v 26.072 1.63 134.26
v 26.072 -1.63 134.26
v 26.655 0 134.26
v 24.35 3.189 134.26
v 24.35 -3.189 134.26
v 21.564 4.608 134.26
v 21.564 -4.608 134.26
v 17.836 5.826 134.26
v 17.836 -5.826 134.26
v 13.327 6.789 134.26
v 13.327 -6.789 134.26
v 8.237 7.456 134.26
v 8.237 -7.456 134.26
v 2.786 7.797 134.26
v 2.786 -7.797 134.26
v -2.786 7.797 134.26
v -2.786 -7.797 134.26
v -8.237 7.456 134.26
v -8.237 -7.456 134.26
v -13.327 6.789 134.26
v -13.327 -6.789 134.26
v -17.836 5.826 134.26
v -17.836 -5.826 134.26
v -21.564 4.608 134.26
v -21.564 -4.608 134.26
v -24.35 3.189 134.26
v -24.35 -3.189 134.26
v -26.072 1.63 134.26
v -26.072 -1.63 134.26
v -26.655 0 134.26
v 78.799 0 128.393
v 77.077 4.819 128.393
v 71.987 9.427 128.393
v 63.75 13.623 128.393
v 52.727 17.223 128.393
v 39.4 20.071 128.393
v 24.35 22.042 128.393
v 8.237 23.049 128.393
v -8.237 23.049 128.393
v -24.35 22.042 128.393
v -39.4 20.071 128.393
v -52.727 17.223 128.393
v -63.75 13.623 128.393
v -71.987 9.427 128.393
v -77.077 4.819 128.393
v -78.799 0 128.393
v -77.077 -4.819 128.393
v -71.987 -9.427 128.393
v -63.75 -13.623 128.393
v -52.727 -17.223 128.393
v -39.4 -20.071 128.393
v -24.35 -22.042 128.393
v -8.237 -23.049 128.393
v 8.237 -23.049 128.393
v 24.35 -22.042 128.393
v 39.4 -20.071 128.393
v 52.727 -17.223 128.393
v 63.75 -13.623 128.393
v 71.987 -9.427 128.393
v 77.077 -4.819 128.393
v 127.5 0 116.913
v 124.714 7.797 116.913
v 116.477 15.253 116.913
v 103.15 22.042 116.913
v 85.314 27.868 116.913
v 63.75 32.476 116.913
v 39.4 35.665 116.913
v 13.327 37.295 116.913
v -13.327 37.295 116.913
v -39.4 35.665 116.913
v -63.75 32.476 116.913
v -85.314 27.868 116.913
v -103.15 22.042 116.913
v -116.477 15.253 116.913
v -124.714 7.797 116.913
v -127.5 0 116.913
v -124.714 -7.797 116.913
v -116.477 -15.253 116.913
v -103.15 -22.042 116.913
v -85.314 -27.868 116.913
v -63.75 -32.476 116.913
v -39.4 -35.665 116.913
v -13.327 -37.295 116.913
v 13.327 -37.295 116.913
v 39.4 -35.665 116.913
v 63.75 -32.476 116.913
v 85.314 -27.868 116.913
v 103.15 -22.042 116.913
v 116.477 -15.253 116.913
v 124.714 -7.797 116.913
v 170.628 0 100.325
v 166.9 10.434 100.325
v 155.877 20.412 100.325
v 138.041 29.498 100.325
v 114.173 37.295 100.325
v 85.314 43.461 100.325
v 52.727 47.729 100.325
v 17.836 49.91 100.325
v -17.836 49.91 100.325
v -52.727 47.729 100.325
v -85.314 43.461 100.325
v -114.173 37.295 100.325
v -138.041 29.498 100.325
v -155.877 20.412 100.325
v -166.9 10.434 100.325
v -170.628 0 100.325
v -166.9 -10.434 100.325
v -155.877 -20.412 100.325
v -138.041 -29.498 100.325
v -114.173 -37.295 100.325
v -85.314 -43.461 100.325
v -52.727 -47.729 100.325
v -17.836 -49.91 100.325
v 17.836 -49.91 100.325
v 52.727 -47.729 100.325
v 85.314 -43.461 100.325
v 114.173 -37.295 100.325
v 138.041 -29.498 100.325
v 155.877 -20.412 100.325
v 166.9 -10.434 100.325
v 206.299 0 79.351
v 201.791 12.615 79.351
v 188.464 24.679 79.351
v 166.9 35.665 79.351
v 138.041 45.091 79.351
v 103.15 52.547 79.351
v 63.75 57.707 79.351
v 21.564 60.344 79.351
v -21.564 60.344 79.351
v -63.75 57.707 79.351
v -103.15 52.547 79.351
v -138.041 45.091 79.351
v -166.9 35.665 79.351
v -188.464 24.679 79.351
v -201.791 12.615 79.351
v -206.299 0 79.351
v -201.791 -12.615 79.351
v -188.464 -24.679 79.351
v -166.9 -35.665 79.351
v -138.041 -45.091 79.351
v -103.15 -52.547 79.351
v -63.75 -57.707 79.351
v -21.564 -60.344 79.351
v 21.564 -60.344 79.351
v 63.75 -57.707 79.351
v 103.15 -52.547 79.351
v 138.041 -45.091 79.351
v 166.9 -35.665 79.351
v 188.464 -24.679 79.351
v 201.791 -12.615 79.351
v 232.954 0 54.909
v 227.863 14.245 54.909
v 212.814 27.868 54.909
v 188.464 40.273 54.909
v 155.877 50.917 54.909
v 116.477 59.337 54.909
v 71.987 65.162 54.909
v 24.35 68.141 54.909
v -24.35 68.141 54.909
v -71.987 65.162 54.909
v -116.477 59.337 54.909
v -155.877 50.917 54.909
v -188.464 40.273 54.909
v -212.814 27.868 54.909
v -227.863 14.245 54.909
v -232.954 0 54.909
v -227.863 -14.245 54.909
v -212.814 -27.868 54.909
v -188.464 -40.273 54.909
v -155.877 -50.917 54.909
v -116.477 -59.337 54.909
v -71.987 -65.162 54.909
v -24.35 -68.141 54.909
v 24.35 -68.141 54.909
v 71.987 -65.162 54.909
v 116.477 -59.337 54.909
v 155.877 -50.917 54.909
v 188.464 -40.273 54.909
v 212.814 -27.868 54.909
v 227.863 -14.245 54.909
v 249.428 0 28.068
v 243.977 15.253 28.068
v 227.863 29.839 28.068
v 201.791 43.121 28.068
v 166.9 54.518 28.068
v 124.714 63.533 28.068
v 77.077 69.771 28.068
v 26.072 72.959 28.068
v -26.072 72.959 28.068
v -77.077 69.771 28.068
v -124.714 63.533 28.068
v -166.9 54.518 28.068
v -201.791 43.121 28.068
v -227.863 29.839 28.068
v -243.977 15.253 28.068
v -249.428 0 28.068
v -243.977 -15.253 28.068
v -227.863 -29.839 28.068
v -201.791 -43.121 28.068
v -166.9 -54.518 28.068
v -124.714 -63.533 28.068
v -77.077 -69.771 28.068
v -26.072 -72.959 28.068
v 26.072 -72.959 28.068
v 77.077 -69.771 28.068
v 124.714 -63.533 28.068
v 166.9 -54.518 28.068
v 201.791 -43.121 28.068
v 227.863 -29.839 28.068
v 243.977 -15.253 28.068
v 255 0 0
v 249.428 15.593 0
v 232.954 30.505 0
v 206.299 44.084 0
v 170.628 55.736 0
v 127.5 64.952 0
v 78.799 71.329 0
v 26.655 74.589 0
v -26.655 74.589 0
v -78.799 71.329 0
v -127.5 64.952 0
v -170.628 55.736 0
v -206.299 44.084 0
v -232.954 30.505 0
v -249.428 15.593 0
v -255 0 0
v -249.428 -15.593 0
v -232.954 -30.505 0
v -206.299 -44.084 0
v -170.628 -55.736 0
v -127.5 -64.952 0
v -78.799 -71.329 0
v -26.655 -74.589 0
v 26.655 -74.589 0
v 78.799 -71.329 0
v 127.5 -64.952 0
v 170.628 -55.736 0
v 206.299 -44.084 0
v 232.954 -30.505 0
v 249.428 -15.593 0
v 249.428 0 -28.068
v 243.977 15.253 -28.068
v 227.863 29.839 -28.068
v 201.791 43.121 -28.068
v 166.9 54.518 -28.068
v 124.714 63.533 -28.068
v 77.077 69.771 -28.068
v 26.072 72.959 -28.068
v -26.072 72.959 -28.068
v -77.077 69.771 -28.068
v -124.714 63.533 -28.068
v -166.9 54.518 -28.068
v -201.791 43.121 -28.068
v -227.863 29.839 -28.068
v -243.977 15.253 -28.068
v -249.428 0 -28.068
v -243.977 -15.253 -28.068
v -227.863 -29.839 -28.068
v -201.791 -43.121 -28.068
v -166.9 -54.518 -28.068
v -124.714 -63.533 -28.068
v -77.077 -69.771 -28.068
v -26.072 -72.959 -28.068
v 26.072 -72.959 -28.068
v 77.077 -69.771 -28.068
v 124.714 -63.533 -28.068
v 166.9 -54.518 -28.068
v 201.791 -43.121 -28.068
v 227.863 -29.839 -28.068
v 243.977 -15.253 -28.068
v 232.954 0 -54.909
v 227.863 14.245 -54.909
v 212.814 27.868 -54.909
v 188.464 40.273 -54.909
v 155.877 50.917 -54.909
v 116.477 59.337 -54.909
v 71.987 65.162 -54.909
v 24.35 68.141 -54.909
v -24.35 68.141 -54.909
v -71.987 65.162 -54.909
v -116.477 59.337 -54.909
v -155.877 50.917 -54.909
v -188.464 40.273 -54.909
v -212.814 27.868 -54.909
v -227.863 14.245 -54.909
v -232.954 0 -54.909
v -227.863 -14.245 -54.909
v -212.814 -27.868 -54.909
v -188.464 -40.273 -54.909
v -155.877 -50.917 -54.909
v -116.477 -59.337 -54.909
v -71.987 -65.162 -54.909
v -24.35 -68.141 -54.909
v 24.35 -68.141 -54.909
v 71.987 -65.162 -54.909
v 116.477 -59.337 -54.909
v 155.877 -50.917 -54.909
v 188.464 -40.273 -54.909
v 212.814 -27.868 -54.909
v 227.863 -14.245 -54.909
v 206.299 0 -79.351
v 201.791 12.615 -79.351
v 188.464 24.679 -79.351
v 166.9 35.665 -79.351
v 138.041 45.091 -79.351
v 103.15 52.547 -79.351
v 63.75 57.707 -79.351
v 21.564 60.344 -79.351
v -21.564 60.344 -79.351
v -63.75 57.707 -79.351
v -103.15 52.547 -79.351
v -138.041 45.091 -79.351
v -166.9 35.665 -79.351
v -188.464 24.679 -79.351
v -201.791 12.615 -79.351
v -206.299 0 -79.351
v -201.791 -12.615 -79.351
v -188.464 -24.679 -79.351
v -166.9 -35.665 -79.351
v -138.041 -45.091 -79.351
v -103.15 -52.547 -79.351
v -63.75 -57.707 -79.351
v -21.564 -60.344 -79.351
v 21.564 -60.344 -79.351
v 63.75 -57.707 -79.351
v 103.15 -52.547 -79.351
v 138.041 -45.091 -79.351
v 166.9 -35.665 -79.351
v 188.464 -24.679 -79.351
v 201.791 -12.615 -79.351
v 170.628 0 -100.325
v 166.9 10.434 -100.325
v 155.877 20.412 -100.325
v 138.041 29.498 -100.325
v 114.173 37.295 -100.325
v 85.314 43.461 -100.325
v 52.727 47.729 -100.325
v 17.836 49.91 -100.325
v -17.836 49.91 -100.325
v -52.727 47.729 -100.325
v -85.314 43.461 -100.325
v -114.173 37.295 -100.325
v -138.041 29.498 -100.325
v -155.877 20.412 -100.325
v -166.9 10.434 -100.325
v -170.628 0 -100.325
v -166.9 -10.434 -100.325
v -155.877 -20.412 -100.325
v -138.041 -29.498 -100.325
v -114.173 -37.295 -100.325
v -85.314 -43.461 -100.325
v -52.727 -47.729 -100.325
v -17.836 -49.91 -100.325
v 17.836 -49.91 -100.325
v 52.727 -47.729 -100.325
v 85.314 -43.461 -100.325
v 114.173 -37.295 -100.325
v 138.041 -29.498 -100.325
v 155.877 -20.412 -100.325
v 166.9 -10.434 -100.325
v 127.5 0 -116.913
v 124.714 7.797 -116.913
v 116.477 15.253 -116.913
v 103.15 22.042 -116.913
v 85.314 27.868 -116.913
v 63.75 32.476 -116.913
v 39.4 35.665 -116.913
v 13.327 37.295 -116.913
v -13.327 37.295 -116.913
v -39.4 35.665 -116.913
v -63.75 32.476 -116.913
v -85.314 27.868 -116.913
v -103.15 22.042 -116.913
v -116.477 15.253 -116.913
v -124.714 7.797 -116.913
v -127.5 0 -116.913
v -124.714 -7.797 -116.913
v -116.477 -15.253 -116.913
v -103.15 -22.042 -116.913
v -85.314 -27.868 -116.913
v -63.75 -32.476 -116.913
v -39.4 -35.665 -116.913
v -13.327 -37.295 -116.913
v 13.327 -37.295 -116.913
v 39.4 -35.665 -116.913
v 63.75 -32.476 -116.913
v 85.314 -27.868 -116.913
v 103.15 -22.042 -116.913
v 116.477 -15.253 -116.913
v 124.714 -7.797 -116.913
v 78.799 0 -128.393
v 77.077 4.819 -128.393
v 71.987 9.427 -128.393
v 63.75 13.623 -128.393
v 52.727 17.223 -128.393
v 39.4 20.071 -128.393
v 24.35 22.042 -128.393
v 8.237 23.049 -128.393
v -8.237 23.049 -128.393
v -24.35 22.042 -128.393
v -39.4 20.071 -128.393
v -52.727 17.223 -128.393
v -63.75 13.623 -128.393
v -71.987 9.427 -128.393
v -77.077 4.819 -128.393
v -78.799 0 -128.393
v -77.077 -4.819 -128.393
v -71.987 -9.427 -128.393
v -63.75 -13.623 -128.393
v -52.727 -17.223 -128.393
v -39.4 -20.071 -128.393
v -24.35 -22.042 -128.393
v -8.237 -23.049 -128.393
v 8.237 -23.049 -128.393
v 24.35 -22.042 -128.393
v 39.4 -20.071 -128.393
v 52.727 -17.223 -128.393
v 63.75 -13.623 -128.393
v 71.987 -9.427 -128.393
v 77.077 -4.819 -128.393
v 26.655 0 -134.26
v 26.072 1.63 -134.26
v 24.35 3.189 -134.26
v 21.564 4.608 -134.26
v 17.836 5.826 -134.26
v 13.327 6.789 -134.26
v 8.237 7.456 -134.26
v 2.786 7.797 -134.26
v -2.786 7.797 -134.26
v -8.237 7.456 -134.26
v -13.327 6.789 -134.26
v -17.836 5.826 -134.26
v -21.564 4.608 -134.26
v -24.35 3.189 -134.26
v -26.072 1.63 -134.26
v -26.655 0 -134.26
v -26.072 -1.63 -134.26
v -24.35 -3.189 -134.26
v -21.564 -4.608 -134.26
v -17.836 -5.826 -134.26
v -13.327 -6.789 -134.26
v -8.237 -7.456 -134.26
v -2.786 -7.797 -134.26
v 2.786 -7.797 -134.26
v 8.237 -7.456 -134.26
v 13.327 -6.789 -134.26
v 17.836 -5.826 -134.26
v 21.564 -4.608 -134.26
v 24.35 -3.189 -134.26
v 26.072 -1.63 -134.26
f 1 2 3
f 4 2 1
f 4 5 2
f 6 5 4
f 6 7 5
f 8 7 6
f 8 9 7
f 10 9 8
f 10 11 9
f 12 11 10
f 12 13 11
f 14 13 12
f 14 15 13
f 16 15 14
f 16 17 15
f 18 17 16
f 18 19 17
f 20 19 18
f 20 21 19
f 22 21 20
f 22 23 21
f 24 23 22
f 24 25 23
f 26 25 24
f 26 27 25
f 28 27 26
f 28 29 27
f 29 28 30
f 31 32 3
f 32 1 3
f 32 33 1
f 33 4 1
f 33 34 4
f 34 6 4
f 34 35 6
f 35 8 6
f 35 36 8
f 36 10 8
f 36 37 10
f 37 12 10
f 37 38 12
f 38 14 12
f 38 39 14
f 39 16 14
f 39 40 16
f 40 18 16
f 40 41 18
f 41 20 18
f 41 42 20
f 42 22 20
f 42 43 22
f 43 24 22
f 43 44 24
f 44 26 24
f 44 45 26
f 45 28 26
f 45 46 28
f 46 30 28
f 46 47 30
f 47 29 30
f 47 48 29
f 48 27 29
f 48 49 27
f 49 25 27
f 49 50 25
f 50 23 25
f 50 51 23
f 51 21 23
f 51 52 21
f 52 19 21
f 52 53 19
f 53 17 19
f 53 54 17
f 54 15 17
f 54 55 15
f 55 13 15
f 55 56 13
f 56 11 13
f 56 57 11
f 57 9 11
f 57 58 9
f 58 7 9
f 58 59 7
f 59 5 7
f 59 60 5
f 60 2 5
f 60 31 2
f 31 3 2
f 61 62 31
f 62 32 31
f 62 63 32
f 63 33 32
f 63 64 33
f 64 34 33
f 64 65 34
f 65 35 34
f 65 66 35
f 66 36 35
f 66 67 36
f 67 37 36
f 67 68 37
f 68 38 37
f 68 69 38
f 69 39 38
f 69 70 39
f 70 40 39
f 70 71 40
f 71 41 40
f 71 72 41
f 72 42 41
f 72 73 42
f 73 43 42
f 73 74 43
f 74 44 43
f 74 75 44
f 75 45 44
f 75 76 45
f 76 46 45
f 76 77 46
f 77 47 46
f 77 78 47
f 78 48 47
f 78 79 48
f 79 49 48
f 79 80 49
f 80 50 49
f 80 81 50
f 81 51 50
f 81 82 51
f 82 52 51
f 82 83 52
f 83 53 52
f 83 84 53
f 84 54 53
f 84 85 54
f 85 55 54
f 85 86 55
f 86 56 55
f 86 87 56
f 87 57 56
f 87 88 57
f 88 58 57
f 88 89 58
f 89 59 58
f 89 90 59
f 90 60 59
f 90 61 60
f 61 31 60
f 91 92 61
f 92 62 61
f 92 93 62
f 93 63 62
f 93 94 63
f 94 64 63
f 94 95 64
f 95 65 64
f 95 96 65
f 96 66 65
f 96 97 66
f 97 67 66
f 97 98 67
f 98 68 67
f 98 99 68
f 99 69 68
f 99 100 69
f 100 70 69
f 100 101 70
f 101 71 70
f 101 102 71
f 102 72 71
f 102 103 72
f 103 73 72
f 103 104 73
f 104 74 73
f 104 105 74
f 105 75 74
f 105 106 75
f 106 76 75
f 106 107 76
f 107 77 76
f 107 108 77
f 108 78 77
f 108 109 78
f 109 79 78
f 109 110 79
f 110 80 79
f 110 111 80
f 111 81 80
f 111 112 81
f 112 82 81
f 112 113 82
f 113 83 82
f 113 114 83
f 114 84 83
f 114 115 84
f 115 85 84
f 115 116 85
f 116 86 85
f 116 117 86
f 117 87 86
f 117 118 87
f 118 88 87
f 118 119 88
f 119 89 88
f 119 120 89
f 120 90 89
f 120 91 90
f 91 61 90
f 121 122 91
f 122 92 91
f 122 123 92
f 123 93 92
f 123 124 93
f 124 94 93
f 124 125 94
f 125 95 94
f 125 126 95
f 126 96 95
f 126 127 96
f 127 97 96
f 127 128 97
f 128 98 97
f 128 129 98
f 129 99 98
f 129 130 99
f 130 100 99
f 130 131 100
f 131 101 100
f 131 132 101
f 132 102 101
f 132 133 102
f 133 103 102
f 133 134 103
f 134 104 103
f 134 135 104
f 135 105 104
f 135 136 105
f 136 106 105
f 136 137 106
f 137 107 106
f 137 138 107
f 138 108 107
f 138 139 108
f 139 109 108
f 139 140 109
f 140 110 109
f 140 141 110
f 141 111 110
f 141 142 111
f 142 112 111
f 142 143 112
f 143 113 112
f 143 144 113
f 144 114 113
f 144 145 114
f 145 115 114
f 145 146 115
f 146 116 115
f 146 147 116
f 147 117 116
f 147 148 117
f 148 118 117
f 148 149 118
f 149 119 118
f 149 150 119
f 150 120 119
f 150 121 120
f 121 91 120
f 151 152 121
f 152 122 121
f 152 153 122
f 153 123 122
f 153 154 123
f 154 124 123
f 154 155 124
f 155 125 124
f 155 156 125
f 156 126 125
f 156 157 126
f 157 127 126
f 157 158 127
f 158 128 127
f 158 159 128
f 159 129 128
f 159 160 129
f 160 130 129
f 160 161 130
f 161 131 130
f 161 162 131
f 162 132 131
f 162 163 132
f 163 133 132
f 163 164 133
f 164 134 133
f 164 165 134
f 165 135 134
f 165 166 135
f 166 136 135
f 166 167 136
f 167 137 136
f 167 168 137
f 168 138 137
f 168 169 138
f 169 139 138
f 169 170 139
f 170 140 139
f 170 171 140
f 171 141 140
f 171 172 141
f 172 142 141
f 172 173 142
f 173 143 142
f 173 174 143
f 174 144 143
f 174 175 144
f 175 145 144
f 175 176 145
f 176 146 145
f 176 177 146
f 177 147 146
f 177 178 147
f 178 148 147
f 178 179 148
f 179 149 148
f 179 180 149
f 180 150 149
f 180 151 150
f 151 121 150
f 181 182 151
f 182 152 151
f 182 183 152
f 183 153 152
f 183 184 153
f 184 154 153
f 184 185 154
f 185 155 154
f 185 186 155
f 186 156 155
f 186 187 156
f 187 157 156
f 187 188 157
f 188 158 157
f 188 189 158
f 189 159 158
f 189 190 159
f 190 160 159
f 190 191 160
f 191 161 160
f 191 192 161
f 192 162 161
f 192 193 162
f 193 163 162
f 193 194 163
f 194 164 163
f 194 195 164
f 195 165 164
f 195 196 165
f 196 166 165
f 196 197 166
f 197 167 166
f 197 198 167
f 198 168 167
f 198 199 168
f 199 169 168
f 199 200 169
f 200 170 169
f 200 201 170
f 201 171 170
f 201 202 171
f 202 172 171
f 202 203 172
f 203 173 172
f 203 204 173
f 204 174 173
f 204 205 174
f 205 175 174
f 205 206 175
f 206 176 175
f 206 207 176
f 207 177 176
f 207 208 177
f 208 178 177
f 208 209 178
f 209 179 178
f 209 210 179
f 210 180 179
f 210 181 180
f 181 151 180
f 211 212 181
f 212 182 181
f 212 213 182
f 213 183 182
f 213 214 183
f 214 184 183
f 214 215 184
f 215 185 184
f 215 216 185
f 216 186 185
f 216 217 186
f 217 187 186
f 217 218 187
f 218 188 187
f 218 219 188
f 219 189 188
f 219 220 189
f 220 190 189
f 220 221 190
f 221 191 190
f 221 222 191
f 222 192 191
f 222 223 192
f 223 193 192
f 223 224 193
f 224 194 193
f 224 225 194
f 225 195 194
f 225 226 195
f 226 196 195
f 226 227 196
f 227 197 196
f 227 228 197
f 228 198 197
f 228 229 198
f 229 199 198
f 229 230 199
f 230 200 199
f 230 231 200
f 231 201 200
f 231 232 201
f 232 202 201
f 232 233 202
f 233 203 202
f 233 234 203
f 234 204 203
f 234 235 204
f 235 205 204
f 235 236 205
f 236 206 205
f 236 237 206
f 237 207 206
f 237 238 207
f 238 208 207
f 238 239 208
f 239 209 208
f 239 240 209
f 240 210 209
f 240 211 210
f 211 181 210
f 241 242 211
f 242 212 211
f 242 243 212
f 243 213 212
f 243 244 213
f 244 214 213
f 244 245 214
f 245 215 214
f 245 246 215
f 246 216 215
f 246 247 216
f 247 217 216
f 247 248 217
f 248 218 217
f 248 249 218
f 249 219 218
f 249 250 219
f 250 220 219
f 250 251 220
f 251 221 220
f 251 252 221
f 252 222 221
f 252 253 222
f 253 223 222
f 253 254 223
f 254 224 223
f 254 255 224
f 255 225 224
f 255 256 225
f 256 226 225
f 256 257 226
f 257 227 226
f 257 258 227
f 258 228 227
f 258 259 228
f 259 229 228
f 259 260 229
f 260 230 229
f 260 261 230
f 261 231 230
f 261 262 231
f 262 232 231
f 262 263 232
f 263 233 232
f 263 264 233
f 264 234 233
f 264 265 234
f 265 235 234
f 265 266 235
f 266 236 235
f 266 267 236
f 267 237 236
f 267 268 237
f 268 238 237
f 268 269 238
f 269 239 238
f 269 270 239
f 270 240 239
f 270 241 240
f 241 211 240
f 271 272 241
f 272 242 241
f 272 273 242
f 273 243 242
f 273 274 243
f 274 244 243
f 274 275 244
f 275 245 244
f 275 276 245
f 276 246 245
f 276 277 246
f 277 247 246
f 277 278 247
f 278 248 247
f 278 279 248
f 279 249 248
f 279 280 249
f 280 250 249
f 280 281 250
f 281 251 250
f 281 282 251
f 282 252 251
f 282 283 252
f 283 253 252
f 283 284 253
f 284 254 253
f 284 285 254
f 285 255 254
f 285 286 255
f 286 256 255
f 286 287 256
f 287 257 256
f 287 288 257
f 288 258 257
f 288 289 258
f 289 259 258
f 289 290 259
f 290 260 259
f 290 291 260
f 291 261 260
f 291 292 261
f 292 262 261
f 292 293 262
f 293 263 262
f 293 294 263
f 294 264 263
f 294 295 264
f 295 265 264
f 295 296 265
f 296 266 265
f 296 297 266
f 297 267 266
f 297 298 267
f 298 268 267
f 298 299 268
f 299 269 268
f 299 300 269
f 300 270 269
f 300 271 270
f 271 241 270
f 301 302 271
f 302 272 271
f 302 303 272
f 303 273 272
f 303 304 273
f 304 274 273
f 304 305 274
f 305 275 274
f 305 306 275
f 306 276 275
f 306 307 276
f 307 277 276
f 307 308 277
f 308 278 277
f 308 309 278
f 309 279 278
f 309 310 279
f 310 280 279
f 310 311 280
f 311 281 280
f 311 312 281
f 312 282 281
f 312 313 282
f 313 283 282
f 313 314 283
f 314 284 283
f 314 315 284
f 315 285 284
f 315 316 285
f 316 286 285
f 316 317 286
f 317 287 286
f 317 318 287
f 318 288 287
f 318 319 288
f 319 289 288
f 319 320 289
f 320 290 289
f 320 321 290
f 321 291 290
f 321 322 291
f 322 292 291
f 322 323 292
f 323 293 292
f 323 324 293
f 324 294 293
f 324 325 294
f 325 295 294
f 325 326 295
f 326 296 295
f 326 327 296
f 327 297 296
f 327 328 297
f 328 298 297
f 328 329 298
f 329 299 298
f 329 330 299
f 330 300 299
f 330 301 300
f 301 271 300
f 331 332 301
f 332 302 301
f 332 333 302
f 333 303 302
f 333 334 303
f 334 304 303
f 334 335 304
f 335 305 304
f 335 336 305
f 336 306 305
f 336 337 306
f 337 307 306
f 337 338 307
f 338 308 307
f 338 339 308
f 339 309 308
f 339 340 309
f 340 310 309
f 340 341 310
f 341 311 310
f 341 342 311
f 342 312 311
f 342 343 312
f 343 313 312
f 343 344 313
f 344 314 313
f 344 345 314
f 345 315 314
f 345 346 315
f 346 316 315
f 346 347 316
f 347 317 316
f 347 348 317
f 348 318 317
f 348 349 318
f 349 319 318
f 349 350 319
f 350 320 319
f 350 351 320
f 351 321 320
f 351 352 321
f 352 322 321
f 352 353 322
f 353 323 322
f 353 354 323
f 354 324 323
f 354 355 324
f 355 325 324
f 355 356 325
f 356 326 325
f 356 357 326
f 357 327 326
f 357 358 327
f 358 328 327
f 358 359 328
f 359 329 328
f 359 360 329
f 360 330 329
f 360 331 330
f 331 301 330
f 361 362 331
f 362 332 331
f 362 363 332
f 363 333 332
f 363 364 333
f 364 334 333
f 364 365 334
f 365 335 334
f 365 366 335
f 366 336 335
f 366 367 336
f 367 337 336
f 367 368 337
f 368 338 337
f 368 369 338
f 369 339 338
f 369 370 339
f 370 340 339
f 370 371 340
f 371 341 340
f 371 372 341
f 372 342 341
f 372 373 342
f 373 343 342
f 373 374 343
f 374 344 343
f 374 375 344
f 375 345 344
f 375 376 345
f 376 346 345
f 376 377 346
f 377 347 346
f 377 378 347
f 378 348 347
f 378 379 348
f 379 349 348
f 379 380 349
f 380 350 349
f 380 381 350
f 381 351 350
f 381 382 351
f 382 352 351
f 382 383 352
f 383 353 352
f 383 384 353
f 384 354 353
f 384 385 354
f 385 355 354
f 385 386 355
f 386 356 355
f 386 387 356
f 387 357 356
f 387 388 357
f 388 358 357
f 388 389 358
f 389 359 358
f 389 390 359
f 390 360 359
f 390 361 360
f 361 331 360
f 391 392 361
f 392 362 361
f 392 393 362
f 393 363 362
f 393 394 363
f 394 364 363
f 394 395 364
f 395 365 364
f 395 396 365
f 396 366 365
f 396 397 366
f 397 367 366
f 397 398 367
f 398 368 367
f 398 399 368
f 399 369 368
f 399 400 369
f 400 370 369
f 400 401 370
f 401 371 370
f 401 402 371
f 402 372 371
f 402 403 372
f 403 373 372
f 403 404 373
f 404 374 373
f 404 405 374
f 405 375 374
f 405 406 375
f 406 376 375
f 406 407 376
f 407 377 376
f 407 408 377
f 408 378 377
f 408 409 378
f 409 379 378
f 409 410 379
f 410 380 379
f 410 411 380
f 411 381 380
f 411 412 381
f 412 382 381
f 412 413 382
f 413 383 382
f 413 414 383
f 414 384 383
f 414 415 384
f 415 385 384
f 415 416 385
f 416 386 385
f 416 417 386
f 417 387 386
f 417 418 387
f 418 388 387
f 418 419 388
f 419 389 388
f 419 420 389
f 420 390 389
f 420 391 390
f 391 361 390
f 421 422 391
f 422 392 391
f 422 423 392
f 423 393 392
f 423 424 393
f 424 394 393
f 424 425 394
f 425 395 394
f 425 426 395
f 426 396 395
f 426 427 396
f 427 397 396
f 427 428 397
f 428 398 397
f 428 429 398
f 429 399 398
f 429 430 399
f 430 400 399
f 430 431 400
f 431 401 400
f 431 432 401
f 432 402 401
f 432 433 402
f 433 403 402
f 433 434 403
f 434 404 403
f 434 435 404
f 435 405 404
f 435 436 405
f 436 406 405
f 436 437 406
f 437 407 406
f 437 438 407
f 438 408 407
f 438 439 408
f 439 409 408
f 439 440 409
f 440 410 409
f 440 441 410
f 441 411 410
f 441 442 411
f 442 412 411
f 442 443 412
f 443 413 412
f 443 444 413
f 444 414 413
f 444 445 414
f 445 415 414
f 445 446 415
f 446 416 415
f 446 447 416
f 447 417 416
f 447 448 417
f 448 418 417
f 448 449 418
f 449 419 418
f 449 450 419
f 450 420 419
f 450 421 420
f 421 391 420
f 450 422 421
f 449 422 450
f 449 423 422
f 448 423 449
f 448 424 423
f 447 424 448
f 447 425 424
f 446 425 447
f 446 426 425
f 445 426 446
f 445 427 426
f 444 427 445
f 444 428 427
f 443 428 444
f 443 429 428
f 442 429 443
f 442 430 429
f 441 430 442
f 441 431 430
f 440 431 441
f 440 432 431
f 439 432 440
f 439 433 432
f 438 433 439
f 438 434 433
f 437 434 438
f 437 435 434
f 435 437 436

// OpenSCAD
// Generated by SolidPython 1.0.1 on 2020-07-29 00:46:52


scale(v = [17, 5, 9]) {
	sphere(r = 15);
}
/***********************************************
*********      SolidPython code:      **********
************************************************
 
# import packages: SolidPython
from solid import *
from solid.utils import *
from itertools import chain, combinations, permutations


class Resize:

    def __init__(self, scad_file):
        self.scad_file = scad_file
        #self.scad_file = import_scad(scad_file)
        # cone/cylinder param:
        self.r1 = 0
        self.r2 = 0
        self.h = 0
        # rectangular prism param:
        self.w = 0
        self.l = 0
        # ellipse param:
        self.r = 0

    # import OpenScad code (file name corresponds to shape)


    # classify shape + parameters
    def assign(self, param1, param2, param3):
        if self.scad_file == 'cone.scad':
            self.r1 = param1
            self.r2 = param2
            self.h = param3
        elif self.scad_file == 'cylinder.scad':
            self.r1 = param1
            self.r2 = param2
            self.h = param3
        elif self.scad_file == 'rectangularPrism.scad':
            self.h = param1
            self.l = param2
            self.w = param3
        else:
            self.r = param1
            self.h = param2

    # resize parameters
    def iterate(self):
        x = range(3, 20, 2)
        i = 1
        if self.scad_file == 'cone.scad':
            tempList = list(permutations(x, 2))
            for temp in tempList:
                param1 = temp[0]
                param2 = temp[1]
                filepath = 'produced_scad_files/' + 'cone' + str(param1) + '_' + str(param2) + '_' + '.scad'
                scad_render_to_file(cylinder(h=param1, r1=param2, r2=0), filepath)

        elif self.scad_file == 'cylinder.scad':
            tempList = list(permutations(x, 3))
            for temp in tempList:
                param1 = temp[0]
                param2 = temp[1]
                filepath = 'produced_scad_files/' + 'cylinder' + str(param1) + '_' + str(param2) + '_' + '.scad'
                scad_render_to_file(cylinder(h=param1, r1=param2, r2=param2), filepath)

        elif self.scad_file == 'rectangularPrism.scad':
            tempList = list(permutations(x, 3))
            for temp in tempList:
                param1 = temp[0]
                param2 = temp[1]
                param3 = temp[2]
                filepath = 'produced_scad_files/' + 'rectangularPrism' + str(param1) + '_' + str(param2) + '_' + str(
                    param3) + '.scad'
                scad_render_to_file(cube(size=(param1, param2, param3)), filepath)

        elif self.scad_file == 'ellipse.scad':
            tempList = list(permutations(x, 4))
            for temp in tempList:
                param1 = temp[0]
                param2 = temp[1]
                param3 = temp[2]
                param4 = temp[3]
                filepath = 'produced_scad_files/' + 'ellipse' + str(param1) + '_' + str(param2) + '_' + str(param3) + '_' + str(param4) + '.scad'
                scad_render_to_file(scale([param1, param2, param3])(sphere(r=param4)), filepath)

    def render_to_scadfile(self):
        scad_render_to_file(scad, 'example.scad') 
 
************************************************/
